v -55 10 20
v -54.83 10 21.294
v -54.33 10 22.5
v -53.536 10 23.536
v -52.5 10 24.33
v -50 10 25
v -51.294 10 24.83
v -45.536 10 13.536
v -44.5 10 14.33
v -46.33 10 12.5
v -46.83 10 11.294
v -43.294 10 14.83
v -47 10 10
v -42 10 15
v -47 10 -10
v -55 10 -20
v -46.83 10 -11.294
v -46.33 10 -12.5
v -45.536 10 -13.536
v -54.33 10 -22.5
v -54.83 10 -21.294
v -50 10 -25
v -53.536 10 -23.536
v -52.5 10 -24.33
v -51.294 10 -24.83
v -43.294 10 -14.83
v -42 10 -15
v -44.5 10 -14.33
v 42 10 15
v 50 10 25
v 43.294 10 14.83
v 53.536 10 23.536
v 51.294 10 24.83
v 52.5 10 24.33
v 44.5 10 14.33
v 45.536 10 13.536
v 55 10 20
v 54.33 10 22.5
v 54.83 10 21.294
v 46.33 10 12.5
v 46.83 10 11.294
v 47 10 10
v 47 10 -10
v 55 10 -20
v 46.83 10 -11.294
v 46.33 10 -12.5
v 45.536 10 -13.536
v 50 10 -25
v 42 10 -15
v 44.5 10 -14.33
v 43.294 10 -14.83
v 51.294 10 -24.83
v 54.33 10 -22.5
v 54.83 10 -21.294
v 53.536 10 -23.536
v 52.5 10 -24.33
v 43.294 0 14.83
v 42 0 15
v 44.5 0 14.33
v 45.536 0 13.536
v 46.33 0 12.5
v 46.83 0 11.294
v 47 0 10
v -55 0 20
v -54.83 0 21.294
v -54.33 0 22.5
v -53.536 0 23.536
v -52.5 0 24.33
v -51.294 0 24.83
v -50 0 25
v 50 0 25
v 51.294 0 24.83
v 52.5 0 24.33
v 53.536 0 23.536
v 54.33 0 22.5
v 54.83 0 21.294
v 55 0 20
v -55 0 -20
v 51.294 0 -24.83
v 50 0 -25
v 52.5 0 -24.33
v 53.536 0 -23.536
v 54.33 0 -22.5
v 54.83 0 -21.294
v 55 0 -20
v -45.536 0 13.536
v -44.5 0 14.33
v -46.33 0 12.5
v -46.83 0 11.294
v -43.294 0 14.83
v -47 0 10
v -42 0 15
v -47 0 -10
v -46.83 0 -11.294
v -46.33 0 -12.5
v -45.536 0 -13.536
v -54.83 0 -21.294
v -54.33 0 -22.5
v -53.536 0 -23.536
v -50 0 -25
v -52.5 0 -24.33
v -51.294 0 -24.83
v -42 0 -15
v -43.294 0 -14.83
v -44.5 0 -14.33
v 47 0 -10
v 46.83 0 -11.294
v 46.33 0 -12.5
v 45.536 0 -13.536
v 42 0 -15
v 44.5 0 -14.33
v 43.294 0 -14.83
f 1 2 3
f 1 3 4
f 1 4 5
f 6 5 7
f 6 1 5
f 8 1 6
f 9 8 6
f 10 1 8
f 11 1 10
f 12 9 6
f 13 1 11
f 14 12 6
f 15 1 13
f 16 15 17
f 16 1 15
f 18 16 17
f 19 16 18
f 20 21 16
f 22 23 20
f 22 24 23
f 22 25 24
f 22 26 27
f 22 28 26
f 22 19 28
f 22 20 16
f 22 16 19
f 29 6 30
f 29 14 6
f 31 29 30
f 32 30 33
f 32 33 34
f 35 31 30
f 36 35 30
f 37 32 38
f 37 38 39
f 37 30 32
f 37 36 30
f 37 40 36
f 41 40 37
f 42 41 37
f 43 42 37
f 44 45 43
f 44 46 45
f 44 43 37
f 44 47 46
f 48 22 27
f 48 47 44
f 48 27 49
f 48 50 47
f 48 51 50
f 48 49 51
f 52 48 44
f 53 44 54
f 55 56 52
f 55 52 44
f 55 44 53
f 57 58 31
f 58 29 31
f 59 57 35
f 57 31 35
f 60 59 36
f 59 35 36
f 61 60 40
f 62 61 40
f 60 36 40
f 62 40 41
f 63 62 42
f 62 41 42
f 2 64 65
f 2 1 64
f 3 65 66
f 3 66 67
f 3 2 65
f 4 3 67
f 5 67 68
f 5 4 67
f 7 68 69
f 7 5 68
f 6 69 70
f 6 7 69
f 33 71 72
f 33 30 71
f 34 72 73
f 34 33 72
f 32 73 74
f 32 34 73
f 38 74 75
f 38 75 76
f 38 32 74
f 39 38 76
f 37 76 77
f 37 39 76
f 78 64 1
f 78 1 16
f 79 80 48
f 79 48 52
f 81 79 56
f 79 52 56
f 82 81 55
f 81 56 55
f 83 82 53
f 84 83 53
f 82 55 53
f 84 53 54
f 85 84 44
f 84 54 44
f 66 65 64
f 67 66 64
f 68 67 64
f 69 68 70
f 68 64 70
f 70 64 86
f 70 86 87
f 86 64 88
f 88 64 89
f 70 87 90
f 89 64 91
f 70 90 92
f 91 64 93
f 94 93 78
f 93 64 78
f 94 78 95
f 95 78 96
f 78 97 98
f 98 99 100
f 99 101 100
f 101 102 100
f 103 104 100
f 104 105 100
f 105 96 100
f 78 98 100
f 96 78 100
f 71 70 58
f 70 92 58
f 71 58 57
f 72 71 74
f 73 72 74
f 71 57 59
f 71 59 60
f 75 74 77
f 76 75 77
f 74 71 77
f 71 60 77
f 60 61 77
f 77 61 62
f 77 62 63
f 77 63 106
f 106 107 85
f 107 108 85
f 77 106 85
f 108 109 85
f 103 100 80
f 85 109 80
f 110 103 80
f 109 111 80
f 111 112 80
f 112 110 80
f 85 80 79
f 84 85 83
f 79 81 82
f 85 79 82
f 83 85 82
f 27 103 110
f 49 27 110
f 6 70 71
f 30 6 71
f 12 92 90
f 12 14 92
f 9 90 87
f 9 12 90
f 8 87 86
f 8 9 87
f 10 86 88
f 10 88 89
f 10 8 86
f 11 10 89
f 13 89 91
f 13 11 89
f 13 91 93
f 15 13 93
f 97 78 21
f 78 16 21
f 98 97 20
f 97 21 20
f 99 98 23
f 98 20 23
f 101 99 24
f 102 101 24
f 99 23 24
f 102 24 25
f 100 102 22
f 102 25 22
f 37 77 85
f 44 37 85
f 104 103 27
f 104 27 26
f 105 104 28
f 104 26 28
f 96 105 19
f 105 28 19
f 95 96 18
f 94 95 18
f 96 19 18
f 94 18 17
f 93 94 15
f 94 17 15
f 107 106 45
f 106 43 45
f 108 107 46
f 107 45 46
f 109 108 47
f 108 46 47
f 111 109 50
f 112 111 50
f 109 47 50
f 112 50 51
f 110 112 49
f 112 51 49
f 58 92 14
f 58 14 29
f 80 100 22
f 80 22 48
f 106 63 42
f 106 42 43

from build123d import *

# Parameters (mm, degrees)
SKETCH1_W           = 110
SKETCH1_H           = 50
SKETCH1_W_2         = 94
SKETCH1_H_2         = 30
BOSS_EXTRUDE1_DEPTH = 10
FILLET1_R           = 5


with BuildPart() as part:
    # Sketch1 → Boss-Extrude1 (new body)
    with BuildSketch(Plane(origin=(0, 0, 0), x_dir=(1, 0, 0), z_dir=(0, 1, 0))):
        Rectangle(SKETCH1_W, SKETCH1_H)
        Rectangle(SKETCH1_W_2, SKETCH1_H_2, mode=Mode.SUBTRACT)
    extrude(amount=BOSS_EXTRUDE1_DEPTH)

    # Fillet1
    fillet1_edges = [part.edges().sort_by_distance(p)[0] for p in [
        (-47, 5, -15),
        (-47, 5, 15),
        (47, 5, 15),
        (47, 5, -15),
        (-55, 5, 25),
        (-55, 5, -25),
        (55, 5, -25),
        (55, 5, 25),
    ]]
    fillet(fillet1_edges, radius=FILLET1_R)


solid = part.part
